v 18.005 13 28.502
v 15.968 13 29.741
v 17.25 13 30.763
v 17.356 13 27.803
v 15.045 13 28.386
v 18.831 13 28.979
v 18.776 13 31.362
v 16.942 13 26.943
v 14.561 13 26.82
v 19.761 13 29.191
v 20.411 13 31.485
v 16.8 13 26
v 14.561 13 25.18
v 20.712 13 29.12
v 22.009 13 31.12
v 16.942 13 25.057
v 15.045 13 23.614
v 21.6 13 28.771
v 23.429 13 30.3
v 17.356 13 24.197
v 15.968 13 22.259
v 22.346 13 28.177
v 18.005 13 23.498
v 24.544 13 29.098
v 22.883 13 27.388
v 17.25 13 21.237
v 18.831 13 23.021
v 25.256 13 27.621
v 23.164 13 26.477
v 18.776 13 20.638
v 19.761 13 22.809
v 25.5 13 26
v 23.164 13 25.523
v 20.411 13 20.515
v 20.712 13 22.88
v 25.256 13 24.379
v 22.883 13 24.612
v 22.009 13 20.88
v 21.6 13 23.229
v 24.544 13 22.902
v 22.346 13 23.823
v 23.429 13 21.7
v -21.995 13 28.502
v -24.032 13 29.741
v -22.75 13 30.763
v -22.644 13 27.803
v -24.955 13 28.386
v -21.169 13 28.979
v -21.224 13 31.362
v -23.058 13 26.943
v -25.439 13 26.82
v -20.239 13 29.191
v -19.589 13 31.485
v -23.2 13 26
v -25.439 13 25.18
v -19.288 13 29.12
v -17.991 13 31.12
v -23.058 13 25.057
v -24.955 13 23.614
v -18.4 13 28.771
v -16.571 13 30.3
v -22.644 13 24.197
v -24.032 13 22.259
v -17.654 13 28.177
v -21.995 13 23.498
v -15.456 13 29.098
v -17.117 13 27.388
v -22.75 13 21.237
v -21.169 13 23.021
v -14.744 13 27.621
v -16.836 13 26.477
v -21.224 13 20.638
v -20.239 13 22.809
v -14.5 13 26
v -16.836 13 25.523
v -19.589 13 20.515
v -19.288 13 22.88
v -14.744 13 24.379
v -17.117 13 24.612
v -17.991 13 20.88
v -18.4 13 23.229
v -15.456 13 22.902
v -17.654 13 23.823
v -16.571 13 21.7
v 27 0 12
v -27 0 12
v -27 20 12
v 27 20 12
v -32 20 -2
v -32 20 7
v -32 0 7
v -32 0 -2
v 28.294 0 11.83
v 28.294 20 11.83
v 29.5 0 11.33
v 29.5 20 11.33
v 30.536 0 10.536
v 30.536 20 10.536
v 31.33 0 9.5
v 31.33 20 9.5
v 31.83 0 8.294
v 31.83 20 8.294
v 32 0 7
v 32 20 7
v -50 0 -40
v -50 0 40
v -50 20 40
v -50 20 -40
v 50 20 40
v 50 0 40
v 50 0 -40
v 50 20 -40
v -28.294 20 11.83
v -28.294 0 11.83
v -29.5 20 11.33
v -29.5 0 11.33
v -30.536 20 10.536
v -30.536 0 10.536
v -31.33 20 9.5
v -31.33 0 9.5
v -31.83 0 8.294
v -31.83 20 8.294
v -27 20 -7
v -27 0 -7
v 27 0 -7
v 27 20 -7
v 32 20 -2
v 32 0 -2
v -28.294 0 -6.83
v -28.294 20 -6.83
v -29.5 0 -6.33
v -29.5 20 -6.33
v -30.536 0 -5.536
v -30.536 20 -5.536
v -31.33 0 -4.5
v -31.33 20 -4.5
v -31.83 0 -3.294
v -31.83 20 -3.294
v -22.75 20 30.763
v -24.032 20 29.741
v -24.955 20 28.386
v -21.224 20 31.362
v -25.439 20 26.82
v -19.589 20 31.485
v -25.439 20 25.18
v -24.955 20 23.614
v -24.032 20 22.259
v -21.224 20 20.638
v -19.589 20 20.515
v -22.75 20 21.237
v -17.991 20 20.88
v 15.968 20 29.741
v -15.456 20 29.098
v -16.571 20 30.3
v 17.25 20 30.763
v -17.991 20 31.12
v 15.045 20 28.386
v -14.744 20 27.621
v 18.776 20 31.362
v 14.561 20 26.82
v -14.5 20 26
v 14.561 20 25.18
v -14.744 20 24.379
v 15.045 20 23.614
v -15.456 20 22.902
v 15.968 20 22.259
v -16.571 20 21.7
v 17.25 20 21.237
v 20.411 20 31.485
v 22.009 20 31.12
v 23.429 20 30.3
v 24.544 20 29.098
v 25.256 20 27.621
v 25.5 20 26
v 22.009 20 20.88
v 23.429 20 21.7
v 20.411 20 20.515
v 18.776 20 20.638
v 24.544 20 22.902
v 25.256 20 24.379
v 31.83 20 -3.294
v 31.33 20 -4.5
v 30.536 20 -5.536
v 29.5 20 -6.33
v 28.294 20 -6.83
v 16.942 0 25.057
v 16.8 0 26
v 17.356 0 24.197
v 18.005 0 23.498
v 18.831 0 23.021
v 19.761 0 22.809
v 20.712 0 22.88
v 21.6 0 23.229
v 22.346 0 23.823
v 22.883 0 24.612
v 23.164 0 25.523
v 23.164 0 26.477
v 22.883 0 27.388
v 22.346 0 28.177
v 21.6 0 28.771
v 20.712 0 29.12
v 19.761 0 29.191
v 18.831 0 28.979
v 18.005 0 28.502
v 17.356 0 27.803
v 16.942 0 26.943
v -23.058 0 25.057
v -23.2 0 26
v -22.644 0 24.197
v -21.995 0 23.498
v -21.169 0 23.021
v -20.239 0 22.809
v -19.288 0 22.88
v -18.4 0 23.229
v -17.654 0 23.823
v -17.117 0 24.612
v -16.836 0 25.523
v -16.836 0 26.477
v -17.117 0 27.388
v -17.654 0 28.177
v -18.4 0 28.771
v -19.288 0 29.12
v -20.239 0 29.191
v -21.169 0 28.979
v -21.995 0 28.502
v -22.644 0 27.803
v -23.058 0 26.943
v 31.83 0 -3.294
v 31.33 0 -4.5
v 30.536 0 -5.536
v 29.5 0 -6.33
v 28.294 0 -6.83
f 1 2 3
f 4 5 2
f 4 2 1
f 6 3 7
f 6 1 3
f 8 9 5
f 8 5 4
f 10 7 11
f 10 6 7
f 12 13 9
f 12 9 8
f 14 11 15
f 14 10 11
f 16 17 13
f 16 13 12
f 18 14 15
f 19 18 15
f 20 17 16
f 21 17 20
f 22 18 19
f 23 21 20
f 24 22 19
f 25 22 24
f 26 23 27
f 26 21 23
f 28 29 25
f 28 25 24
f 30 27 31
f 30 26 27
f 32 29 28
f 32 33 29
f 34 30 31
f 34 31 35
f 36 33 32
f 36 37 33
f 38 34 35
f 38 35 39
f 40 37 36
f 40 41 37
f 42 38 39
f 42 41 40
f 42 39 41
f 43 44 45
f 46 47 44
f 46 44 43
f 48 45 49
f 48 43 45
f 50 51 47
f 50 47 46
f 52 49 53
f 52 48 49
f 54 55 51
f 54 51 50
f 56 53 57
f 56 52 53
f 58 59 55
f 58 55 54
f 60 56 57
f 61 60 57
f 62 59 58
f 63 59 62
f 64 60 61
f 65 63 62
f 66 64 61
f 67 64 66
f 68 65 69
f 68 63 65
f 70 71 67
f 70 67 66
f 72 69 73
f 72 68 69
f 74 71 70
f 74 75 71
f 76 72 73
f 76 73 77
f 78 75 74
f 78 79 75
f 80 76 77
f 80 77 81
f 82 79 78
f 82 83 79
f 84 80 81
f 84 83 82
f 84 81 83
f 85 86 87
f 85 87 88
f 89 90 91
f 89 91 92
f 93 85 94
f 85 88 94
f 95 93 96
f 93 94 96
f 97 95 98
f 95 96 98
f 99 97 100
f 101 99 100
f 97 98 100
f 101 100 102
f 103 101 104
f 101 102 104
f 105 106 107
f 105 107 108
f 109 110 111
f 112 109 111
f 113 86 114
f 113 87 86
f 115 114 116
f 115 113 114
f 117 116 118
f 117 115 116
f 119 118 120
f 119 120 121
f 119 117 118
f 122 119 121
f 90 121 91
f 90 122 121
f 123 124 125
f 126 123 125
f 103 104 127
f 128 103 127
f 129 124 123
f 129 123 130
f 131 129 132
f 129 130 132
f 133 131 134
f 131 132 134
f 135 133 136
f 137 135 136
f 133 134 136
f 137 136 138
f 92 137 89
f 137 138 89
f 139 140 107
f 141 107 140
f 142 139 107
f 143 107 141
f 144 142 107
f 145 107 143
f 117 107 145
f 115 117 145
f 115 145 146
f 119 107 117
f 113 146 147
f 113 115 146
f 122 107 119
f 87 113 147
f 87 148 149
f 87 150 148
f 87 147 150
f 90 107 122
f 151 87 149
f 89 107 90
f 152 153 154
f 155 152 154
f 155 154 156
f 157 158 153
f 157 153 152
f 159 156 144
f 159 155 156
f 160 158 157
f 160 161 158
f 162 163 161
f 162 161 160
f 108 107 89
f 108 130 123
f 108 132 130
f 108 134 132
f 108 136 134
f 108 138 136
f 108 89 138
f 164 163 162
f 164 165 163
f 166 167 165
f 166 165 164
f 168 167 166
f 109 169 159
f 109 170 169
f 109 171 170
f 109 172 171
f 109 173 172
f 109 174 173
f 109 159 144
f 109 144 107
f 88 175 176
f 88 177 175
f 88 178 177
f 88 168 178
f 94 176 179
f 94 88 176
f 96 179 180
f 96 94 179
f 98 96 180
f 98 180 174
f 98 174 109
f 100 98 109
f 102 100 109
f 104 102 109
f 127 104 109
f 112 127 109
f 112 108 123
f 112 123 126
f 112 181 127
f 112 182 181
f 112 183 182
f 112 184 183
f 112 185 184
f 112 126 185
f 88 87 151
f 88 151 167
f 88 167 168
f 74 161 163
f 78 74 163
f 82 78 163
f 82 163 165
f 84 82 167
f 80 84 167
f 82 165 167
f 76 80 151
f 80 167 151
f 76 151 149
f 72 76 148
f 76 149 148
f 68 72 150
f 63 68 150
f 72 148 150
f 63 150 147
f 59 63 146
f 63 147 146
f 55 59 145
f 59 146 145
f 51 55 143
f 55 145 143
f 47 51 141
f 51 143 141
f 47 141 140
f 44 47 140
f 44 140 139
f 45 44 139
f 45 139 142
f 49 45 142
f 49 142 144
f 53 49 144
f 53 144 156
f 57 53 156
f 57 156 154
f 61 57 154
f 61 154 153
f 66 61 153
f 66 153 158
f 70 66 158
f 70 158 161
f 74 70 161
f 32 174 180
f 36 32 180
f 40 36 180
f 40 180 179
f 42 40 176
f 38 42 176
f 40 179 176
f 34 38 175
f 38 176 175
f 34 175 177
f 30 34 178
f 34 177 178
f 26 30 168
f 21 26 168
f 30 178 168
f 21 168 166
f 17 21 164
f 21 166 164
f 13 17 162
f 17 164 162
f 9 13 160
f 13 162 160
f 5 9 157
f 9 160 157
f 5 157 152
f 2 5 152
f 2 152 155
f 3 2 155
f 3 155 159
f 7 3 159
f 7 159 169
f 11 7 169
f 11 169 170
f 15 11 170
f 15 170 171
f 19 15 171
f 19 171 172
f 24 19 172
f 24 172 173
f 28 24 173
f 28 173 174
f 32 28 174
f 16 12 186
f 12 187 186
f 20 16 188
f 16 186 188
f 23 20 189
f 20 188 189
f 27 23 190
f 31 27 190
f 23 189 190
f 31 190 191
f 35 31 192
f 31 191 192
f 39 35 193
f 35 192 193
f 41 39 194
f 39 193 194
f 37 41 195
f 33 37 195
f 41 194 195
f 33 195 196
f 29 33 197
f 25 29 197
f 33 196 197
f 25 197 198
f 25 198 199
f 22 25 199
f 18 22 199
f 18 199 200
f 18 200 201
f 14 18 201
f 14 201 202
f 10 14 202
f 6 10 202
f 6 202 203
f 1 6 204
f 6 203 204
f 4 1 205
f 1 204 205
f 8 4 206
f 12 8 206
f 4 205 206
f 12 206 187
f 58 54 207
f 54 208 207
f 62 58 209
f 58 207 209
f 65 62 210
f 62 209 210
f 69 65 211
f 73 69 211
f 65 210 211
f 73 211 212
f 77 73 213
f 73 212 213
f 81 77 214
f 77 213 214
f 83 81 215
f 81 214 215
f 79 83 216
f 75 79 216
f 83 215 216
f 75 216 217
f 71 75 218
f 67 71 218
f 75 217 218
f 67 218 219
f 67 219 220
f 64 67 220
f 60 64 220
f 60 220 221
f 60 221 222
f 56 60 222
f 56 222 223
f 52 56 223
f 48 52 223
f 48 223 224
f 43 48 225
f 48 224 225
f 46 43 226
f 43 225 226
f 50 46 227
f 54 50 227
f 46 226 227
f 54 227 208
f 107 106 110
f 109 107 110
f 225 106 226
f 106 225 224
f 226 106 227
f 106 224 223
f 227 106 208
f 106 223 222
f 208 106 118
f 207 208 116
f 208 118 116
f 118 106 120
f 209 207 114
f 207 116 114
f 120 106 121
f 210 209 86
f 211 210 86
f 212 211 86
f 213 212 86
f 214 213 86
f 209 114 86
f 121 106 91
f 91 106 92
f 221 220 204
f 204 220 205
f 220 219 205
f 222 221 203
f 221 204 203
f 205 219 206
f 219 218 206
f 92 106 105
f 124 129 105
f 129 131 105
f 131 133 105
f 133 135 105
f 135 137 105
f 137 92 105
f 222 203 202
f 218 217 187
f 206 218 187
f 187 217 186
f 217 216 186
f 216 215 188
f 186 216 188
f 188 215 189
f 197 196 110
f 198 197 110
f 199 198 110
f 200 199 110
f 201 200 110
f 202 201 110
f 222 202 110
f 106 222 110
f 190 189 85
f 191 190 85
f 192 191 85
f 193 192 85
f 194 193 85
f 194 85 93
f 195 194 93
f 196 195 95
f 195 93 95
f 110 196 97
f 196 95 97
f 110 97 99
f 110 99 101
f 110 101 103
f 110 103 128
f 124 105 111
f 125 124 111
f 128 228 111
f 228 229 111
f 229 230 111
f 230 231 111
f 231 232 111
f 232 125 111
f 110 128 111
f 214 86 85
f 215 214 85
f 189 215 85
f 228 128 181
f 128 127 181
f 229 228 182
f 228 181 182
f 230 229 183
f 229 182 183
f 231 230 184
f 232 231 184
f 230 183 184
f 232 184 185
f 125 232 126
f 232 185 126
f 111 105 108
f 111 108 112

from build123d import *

# Parameters (mm, degrees)
SKETCH_1_W                = 100
SKETCH_1_H                = 80
SKETCH_1_W_2              = 64
SKETCH_1_H_2              = 19
EXTRUDE_1_DEPTH           = 20
FILLET_1_R                = 5
HOLE_WIZARD_1_D           = 6.4
HOLE_WIZARD_1_DEPTH       = 100
HOLE_WIZARD_1_CBORE_D     = 11
HOLE_WIZARD_1_CBORE_DEPTH = 7


with BuildPart() as part:
    # 草图1 → 凸台-拉伸1 (new body)
    with BuildSketch(Plane(origin=(0, 0, 0), x_dir=(1, 0, 0), z_dir=(0, 1, 0))):
        Rectangle(SKETCH_1_W, SKETCH_1_H)
        with Locations((0, -2.5)):
            Rectangle(SKETCH_1_W_2, SKETCH_1_H_2, mode=Mode.SUBTRACT)
    extrude(amount=EXTRUDE_1_DEPTH)

    # 圆角1
    fillet_1_edges = [part.edges().sort_by_distance(p)[0] for p in [
        (-32, 10, -7),
        (-32, 10, 12),
        (32, 10, 12),
        (32, 10, -7),
    ]]
    fillet(fillet_1_edges, radius=FILLET_1_R)

    # 孔1
    with Locations(Plane(origin=(0, 20, 0), x_dir=(1, 0, 0), z_dir=(0, 1, 0))):
        with Locations((20, -26), (-20, -26)):
            CounterBoreHole(HOLE_WIZARD_1_D / 2, HOLE_WIZARD_1_CBORE_D / 2, HOLE_WIZARD_1_CBORE_DEPTH, depth=HOLE_WIZARD_1_DEPTH)


solid = part.part
